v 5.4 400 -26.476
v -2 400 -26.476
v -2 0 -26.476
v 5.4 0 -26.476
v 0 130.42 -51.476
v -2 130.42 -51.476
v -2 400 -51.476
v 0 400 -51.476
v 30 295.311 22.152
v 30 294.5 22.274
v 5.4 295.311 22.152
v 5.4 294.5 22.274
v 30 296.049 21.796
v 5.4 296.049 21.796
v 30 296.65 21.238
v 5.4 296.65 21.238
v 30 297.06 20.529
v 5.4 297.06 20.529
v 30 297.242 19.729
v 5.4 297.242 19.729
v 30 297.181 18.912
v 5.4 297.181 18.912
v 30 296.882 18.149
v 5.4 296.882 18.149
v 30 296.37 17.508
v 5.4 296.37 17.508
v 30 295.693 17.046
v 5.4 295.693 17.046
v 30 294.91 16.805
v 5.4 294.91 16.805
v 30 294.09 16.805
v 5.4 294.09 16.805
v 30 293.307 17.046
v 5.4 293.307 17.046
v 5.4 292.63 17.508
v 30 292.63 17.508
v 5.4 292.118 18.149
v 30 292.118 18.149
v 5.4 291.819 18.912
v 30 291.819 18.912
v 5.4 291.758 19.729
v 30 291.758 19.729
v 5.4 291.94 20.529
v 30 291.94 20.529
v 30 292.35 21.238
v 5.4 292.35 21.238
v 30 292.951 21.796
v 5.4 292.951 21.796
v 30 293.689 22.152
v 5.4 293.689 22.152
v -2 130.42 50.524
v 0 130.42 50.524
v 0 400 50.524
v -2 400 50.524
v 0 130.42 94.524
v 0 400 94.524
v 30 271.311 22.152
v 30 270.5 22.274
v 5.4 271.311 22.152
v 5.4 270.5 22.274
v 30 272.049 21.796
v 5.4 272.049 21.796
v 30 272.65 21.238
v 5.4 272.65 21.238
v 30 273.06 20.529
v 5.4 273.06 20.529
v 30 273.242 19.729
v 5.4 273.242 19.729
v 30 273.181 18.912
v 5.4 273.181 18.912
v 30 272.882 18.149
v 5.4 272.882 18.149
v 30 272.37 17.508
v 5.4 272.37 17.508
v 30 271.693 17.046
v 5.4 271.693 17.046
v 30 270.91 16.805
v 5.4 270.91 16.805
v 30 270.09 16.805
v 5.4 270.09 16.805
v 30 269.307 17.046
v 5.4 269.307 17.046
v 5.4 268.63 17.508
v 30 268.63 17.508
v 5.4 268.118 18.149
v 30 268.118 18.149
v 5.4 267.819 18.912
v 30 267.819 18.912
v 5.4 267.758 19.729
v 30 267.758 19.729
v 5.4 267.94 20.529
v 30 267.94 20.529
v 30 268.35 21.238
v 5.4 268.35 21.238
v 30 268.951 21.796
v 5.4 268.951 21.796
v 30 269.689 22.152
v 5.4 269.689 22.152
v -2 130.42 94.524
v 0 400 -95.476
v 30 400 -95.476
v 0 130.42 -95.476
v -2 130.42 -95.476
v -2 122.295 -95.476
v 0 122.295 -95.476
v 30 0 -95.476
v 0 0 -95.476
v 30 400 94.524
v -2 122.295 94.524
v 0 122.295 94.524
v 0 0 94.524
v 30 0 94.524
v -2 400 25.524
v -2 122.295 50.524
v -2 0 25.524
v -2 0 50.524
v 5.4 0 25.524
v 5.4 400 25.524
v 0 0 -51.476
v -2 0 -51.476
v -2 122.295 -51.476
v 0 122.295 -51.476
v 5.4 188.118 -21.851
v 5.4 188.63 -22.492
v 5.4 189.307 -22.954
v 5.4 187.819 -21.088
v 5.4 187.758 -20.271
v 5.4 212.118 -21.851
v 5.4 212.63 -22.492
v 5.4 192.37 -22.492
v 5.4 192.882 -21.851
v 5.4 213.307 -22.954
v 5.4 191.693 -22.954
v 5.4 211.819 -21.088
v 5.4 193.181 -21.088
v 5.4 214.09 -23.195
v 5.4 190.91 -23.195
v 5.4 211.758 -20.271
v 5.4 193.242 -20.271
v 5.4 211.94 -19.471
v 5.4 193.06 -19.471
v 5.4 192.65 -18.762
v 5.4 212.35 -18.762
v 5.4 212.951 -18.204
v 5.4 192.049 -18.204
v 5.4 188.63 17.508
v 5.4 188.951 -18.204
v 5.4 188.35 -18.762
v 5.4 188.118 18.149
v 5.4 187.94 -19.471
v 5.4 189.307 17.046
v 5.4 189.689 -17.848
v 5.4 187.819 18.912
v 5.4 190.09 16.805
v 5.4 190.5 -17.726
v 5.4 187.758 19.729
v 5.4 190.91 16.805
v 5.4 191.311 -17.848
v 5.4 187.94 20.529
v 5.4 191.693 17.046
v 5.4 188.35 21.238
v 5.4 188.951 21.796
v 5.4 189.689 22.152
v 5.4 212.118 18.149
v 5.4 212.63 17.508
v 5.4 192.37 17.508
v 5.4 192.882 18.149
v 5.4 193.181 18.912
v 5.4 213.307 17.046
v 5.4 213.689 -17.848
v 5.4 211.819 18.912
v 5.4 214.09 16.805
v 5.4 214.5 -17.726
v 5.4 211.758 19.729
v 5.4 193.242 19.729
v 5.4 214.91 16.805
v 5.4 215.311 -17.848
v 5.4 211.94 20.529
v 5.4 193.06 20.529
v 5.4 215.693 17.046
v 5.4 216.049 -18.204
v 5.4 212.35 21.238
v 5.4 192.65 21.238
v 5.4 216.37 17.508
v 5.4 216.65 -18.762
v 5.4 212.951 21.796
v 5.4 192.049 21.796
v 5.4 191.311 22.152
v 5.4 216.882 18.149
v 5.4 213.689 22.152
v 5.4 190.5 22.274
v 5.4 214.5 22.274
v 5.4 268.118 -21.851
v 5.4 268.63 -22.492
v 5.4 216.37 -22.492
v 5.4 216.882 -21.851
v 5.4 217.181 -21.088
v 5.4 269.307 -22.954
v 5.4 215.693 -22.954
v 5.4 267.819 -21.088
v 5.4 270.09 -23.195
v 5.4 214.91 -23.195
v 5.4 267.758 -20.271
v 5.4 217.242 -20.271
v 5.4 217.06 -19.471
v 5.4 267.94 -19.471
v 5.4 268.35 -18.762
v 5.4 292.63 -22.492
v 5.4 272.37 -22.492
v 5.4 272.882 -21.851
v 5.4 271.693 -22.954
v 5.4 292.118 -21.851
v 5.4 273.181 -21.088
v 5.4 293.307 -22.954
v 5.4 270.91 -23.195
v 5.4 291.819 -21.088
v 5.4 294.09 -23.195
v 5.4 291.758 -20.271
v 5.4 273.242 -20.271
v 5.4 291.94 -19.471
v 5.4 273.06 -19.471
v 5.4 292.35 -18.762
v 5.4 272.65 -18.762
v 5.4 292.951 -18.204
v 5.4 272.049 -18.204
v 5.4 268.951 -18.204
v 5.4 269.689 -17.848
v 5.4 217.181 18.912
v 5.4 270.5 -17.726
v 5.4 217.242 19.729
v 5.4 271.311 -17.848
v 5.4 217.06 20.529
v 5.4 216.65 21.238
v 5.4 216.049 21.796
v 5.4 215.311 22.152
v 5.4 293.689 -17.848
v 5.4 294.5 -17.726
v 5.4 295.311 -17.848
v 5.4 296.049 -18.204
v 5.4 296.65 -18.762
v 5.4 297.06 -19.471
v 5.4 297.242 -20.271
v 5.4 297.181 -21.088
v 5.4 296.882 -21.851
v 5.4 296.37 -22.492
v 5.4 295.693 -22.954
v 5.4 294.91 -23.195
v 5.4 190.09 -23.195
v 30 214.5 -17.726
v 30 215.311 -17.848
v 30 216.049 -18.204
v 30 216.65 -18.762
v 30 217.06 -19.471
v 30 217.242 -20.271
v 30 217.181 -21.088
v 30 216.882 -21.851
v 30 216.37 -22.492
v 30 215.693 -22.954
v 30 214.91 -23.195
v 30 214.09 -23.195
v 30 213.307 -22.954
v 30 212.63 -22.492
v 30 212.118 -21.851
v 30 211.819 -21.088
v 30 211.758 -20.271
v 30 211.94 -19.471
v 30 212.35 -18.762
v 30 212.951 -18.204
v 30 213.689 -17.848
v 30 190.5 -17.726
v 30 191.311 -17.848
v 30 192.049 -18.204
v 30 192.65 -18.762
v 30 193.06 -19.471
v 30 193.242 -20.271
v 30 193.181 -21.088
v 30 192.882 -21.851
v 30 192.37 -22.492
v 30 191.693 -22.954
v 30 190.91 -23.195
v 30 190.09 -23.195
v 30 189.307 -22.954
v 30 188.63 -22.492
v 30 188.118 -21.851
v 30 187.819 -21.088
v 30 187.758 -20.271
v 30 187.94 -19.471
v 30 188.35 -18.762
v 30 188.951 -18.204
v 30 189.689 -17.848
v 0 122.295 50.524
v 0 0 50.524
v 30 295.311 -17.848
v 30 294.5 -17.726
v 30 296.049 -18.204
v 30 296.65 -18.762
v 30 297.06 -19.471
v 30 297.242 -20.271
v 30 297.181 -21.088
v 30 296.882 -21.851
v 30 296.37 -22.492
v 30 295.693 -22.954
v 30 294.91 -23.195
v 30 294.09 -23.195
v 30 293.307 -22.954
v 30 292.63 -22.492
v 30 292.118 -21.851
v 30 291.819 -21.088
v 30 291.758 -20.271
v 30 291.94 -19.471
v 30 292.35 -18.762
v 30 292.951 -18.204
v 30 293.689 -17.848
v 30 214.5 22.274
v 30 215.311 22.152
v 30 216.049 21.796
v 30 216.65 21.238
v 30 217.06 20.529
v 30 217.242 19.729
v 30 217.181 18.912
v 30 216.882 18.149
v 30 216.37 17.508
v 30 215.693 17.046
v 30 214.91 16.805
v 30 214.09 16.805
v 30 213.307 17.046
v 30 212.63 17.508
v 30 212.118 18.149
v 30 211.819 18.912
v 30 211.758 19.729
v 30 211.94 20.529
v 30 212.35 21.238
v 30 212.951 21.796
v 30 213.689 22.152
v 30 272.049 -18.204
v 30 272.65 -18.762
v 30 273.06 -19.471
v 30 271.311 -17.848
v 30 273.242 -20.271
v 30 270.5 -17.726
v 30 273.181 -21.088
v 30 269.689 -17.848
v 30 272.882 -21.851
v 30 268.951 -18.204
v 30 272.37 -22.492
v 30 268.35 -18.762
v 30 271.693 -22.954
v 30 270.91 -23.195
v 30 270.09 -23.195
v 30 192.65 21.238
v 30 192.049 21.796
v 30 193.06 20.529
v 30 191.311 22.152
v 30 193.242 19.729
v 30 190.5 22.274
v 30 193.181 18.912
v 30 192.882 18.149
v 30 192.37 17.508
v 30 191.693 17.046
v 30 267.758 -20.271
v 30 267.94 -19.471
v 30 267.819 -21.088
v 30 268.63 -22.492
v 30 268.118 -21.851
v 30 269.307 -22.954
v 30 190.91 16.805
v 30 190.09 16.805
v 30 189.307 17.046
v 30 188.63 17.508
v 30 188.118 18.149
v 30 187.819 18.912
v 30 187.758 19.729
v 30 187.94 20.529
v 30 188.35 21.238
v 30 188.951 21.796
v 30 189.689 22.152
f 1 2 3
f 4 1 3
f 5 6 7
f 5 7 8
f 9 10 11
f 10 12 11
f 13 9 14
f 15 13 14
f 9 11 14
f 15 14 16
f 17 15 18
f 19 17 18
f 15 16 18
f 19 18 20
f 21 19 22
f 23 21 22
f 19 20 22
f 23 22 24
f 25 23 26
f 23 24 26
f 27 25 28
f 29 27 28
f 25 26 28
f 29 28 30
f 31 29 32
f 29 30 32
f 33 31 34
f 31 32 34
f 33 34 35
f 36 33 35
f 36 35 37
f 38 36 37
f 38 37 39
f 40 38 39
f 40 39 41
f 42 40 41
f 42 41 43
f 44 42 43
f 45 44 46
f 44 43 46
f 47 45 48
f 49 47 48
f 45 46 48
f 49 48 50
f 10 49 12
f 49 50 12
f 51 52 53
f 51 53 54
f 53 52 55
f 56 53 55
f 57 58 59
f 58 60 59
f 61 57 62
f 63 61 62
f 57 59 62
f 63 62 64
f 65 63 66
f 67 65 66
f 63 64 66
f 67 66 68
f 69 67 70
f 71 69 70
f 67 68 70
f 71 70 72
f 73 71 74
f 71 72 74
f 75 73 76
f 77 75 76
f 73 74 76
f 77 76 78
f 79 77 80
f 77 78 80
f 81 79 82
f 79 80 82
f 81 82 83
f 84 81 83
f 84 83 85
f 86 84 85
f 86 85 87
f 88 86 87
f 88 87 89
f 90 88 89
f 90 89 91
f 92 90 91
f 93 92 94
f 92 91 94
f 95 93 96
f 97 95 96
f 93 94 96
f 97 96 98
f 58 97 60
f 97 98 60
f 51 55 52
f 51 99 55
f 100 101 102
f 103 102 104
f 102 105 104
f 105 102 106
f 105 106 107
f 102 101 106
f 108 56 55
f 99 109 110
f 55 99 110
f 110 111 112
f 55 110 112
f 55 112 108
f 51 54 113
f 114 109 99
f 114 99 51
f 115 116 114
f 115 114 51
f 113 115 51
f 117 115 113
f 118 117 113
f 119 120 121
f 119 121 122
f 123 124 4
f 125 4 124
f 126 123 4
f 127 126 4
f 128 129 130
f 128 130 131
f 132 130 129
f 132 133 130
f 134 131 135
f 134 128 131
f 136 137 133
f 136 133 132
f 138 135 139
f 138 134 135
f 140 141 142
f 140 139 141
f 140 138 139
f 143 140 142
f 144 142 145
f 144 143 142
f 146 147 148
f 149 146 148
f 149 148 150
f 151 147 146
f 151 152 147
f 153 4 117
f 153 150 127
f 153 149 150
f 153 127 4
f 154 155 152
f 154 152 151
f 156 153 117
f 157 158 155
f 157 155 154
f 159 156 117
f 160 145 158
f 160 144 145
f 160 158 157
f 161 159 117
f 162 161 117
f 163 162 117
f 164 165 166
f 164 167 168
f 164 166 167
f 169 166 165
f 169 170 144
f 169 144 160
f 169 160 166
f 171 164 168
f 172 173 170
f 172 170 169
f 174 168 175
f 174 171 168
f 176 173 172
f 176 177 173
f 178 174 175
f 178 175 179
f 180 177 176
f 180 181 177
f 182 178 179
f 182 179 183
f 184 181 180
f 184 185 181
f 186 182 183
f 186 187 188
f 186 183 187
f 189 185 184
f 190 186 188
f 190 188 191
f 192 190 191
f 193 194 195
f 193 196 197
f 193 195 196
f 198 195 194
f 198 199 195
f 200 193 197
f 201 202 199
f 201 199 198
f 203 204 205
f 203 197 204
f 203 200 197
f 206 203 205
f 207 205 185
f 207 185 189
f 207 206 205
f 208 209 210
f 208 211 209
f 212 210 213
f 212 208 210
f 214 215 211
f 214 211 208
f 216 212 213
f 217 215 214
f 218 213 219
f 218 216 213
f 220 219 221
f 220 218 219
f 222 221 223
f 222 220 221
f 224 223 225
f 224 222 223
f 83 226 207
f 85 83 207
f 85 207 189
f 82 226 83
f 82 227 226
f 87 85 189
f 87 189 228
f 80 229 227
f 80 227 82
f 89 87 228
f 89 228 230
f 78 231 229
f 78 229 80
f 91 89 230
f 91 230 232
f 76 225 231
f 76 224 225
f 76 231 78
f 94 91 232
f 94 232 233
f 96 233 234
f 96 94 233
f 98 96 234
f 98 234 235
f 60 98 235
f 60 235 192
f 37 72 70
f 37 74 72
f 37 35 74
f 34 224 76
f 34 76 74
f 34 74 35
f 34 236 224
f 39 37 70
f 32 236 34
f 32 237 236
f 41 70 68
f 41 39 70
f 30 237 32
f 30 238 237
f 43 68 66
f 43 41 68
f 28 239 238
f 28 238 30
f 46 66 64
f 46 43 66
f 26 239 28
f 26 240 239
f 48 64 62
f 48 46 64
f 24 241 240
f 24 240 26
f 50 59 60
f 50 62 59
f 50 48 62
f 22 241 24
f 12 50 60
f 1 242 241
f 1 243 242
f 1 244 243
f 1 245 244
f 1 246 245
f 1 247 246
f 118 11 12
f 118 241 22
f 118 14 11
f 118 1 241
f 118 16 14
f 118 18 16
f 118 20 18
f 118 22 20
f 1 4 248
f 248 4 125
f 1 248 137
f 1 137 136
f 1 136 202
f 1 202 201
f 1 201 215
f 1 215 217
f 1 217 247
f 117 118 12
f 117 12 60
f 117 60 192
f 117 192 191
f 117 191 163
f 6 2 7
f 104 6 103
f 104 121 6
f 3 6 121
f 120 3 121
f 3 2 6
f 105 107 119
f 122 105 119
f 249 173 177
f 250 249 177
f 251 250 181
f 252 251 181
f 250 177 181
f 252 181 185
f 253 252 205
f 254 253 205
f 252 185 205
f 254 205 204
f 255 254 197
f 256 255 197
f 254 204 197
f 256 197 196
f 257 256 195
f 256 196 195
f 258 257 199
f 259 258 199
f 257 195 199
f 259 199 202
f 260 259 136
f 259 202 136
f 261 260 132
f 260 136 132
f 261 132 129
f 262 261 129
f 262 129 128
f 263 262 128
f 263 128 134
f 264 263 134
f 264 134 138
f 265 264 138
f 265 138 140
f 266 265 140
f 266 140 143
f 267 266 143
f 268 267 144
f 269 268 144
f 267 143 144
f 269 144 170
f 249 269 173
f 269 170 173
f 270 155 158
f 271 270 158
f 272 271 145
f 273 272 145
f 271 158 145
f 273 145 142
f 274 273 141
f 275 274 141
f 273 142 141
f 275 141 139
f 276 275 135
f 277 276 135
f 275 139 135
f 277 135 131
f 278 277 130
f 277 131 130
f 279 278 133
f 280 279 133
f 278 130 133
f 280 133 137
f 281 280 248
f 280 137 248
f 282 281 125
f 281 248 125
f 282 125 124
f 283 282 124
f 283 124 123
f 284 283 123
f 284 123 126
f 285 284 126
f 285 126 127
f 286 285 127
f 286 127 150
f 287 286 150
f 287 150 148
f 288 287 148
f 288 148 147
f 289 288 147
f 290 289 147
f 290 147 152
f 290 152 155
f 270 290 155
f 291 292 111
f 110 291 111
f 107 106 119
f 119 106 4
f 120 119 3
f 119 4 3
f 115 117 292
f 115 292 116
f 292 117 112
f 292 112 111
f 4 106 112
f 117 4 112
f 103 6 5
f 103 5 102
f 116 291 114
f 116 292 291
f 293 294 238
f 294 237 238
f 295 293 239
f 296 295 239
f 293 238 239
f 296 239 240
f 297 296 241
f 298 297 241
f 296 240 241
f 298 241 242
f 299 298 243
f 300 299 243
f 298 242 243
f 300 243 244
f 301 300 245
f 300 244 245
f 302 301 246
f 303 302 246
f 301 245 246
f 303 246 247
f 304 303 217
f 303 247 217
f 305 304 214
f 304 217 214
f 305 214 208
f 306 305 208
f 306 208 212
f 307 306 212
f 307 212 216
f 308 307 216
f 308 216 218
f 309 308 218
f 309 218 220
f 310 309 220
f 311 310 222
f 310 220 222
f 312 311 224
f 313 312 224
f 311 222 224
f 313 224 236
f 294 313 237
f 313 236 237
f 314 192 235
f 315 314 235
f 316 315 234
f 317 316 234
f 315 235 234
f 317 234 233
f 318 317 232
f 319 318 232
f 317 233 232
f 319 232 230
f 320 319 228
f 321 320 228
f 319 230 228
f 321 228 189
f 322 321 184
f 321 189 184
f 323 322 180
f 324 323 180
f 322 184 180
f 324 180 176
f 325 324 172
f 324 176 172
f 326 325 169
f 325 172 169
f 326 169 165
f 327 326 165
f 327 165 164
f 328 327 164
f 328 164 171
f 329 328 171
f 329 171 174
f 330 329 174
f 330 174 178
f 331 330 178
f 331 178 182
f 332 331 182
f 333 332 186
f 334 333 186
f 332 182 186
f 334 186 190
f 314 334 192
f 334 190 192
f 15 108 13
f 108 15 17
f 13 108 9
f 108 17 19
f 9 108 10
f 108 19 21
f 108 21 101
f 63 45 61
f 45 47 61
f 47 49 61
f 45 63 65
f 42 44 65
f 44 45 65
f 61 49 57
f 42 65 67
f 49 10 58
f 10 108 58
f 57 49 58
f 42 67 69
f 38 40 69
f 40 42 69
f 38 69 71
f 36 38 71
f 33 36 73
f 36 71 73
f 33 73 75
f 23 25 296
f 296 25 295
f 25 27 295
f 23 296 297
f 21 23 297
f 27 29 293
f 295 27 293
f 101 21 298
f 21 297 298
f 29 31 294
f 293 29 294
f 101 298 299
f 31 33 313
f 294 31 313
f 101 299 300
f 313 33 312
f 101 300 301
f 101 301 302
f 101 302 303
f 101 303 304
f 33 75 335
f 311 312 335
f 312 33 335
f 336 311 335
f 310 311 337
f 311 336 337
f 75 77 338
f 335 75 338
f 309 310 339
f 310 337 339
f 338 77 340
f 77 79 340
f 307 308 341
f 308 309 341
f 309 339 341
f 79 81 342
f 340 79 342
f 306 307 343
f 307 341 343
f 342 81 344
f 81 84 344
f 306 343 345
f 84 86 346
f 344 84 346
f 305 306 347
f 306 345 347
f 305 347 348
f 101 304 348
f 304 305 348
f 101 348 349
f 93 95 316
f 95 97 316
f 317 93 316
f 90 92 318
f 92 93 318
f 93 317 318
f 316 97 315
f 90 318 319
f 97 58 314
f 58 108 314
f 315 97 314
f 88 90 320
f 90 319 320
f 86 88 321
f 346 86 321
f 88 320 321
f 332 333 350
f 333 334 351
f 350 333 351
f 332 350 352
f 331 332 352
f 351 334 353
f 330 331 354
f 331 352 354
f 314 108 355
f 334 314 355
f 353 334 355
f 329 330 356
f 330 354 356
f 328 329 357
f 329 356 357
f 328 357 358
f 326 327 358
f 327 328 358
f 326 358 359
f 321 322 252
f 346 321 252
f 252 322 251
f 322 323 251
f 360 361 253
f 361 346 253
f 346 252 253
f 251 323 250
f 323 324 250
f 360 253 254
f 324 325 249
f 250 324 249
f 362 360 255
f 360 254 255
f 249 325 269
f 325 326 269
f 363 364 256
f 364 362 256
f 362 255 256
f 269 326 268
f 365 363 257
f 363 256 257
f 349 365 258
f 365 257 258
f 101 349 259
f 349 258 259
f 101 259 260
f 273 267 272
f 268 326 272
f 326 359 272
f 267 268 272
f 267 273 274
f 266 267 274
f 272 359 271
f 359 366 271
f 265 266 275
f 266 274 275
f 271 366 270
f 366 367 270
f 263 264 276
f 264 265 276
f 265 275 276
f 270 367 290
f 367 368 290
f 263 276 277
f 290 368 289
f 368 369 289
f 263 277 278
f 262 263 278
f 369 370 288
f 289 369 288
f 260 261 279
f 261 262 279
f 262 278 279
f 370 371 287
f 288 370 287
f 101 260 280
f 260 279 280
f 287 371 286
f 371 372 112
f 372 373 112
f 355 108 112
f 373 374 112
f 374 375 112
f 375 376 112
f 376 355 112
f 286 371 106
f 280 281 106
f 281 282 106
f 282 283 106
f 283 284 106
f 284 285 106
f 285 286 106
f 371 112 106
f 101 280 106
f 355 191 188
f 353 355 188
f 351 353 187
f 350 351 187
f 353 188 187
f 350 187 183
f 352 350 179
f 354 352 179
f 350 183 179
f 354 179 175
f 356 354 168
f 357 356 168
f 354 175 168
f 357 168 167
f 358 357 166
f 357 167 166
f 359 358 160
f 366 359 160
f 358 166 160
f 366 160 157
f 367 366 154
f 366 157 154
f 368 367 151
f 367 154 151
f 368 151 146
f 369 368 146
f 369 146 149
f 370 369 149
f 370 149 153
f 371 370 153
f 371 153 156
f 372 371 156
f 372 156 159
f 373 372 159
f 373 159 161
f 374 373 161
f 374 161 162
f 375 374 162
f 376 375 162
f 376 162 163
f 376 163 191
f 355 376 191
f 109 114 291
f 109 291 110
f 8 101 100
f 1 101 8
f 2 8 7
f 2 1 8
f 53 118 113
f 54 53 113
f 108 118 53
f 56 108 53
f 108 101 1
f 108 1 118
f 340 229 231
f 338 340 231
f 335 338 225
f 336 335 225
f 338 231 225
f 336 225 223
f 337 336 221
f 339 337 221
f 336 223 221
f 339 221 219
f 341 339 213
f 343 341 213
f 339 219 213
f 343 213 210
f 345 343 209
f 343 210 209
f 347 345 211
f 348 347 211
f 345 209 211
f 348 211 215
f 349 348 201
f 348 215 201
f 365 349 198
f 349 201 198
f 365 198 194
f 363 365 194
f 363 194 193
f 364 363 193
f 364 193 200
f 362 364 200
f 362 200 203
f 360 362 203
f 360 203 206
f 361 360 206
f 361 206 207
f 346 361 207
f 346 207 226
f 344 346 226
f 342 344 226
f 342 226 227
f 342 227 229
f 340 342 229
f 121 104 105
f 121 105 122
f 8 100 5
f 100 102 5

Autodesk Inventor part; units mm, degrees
ref_plane "YZ Plane" through (0, 0, 0) normal (1, 0, 0) x (0, 1, 0)
ref_plane "XZ Plane" through (0, 0, 0) normal (0, 1, 0) x (-1, 0, 0)
ref_plane "XY Plane" through (0, 0, 0) normal (0, 0, 1) x (1, 0, 0)
sketch "Эскиз1" plane through (0, 0, 0) normal (0, 1, 0) x (-1, 0, 0)
  line L0 (0, 94.5239) -> (-30, 94.5239)
  line L1 (-30, 94.5239) -> (-30, -95.4761)
  line L2 (-30, -95.4761) -> (0, -95.4761)
  line L3 (0, -95.4761) -> (0, 94.5239)
  line L4 (-30, 50.5239) -> (2, 50.5239)
  line L5 (2, 50.5239) -> (2, -51.4761)
  line L6 (2, -51.4761) -> (-30, -51.4761)
  line L7 (-30, -51.4761) -> (-30, 50.5239)
  point P0 (0, 0)
  point P1 (0, -51.4761)
  point P2 (0, 50.5239)
  dimension "d0" = 190
  dimension "d2" = 30
  dimension "d3" = 32
  dimension "d4" = 44
  dimension "d13" = 44
extrude "Выдавливание1" add sketch "Эскиз1" along normal blind 400
sketch "Эскиз2" plane through (-2, 0, -51.4761) normal (-1, 0, 0) x (0, 0, 1)
  line L0 (25, -29) -> (77, -29)
  line L1 (77, -29) -> (77, 456)
  line L2 (77, 456) -> (25, 456)
  line L3 (25, 456) -> (25, -29)
  line L4 (0, 0) -> (102, 0) projected
  line L5 (102, 0) -> (102, 400) projected
  line L6 (0, 400) -> (102, 400) projected
  line L7 (0, 0) -> (0, 400) projected
  point P0 (51.4761, 0)
  point P1 (77, 400)
  point P2 (25, 400)
  point P3 (25, 0)
  point P4 (77, 0)
  dimension "d8" = 25
  dimension "d9" = 25
  dimension "d10" = 52
extrude "Выдавливание2" cut sketch "Эскиз2" against normal blind 7.4 contours L3 L6 L1 L4
sketch "Эскиз3" plane through (-2, 0, 50.5239) normal (-1, 0, 0) x (0, 0, 1)
  line L0 (44, 0) -> (44, 400) projected
  line L1 (-146, 0) -> (-146, 400) projected
  line L2 (44, 130.4195) -> (-146, 130.4195)
  line L3 (-146, 130.4195) -> (-146, 122.295)
  line L4 (-146, 122.295) -> (44, 122.295)
  line L5 (44, 122.295) -> (44, 130.4195)
  line L6 (-25, 400) -> (-25, 0) projected
  line L7 (-25, 0) -> (0, 0) projected
  line L8 (0, 0) -> (0, 400) projected
  line L9 (-25, 400) -> (0, 400) projected
  line L10 (-77, 0) -> (-77, 400) projected
  line L11 (-102, 400) -> (-77, 400) projected
  line L12 (-102, 0) -> (-102, 400) projected
  line L13 (-102, 0) -> (-77, 0) projected
  point P0 (-50.5239, 0)
  point P1 (0, 130.4195)
  point P2 (0, 122.295)
  point P3 (-102, 122.295)
  point P4 (-102, 130.4195)
extrude "Выдавливание3" add sketch "Эскиз3" against normal blind 10 contours L4 L8 L2 L0 | L4 L1 L2 L12
sketch "Эскиз4" plane through (5.4, 0, -51.4761) normal (-1, 0, 0) x (0, 0, 1)
  line L0 (76.5, 183) -> (25.5, 183)
  line L1 (76.5, 222) -> (76.5, 183)
  line L2 (25.5, 222) -> (76.5, 222)
  line L3 (25.5, 183) -> (25.5, 222)
  circle A0 centre (71, 190.5) radius 2.75
  circle A1 centre (31, 190.5) radius 2.75
  circle A2 centre (31, 214.5) radius 2.75
  circle A3 centre (71, 214.5) radius 2.75
  line L4 (76, 263) -> (77, 263)
  line L5 (76.5, 263) -> (76.5, 222)
  line L6 (76.5, 263) -> (25.5, 263)
  line L7 (76.5, 302) -> (76.5, 263)
  line L8 (25.5, 302) -> (76.5, 302)
  line L9 (25.5, 263) -> (25.5, 302)
  circle A4 centre (71, 270.5) radius 2.75
  circle A5 centre (31, 270.5) radius 2.75
  circle A6 centre (31, 294.5) radius 2.75
  circle A7 centre (71, 294.5) radius 2.75
  point P0 (51.4761, 0)
  point P1 (51, 182.5)
  point P2 (51, 262.5)
extrude "Выдавливание4" cut sketch "Эскиз4" against normal blind 33 contours A0 | A1 | A2 | A3 | A4 | A5 | A6 | A7
properties part number "Zplita"
